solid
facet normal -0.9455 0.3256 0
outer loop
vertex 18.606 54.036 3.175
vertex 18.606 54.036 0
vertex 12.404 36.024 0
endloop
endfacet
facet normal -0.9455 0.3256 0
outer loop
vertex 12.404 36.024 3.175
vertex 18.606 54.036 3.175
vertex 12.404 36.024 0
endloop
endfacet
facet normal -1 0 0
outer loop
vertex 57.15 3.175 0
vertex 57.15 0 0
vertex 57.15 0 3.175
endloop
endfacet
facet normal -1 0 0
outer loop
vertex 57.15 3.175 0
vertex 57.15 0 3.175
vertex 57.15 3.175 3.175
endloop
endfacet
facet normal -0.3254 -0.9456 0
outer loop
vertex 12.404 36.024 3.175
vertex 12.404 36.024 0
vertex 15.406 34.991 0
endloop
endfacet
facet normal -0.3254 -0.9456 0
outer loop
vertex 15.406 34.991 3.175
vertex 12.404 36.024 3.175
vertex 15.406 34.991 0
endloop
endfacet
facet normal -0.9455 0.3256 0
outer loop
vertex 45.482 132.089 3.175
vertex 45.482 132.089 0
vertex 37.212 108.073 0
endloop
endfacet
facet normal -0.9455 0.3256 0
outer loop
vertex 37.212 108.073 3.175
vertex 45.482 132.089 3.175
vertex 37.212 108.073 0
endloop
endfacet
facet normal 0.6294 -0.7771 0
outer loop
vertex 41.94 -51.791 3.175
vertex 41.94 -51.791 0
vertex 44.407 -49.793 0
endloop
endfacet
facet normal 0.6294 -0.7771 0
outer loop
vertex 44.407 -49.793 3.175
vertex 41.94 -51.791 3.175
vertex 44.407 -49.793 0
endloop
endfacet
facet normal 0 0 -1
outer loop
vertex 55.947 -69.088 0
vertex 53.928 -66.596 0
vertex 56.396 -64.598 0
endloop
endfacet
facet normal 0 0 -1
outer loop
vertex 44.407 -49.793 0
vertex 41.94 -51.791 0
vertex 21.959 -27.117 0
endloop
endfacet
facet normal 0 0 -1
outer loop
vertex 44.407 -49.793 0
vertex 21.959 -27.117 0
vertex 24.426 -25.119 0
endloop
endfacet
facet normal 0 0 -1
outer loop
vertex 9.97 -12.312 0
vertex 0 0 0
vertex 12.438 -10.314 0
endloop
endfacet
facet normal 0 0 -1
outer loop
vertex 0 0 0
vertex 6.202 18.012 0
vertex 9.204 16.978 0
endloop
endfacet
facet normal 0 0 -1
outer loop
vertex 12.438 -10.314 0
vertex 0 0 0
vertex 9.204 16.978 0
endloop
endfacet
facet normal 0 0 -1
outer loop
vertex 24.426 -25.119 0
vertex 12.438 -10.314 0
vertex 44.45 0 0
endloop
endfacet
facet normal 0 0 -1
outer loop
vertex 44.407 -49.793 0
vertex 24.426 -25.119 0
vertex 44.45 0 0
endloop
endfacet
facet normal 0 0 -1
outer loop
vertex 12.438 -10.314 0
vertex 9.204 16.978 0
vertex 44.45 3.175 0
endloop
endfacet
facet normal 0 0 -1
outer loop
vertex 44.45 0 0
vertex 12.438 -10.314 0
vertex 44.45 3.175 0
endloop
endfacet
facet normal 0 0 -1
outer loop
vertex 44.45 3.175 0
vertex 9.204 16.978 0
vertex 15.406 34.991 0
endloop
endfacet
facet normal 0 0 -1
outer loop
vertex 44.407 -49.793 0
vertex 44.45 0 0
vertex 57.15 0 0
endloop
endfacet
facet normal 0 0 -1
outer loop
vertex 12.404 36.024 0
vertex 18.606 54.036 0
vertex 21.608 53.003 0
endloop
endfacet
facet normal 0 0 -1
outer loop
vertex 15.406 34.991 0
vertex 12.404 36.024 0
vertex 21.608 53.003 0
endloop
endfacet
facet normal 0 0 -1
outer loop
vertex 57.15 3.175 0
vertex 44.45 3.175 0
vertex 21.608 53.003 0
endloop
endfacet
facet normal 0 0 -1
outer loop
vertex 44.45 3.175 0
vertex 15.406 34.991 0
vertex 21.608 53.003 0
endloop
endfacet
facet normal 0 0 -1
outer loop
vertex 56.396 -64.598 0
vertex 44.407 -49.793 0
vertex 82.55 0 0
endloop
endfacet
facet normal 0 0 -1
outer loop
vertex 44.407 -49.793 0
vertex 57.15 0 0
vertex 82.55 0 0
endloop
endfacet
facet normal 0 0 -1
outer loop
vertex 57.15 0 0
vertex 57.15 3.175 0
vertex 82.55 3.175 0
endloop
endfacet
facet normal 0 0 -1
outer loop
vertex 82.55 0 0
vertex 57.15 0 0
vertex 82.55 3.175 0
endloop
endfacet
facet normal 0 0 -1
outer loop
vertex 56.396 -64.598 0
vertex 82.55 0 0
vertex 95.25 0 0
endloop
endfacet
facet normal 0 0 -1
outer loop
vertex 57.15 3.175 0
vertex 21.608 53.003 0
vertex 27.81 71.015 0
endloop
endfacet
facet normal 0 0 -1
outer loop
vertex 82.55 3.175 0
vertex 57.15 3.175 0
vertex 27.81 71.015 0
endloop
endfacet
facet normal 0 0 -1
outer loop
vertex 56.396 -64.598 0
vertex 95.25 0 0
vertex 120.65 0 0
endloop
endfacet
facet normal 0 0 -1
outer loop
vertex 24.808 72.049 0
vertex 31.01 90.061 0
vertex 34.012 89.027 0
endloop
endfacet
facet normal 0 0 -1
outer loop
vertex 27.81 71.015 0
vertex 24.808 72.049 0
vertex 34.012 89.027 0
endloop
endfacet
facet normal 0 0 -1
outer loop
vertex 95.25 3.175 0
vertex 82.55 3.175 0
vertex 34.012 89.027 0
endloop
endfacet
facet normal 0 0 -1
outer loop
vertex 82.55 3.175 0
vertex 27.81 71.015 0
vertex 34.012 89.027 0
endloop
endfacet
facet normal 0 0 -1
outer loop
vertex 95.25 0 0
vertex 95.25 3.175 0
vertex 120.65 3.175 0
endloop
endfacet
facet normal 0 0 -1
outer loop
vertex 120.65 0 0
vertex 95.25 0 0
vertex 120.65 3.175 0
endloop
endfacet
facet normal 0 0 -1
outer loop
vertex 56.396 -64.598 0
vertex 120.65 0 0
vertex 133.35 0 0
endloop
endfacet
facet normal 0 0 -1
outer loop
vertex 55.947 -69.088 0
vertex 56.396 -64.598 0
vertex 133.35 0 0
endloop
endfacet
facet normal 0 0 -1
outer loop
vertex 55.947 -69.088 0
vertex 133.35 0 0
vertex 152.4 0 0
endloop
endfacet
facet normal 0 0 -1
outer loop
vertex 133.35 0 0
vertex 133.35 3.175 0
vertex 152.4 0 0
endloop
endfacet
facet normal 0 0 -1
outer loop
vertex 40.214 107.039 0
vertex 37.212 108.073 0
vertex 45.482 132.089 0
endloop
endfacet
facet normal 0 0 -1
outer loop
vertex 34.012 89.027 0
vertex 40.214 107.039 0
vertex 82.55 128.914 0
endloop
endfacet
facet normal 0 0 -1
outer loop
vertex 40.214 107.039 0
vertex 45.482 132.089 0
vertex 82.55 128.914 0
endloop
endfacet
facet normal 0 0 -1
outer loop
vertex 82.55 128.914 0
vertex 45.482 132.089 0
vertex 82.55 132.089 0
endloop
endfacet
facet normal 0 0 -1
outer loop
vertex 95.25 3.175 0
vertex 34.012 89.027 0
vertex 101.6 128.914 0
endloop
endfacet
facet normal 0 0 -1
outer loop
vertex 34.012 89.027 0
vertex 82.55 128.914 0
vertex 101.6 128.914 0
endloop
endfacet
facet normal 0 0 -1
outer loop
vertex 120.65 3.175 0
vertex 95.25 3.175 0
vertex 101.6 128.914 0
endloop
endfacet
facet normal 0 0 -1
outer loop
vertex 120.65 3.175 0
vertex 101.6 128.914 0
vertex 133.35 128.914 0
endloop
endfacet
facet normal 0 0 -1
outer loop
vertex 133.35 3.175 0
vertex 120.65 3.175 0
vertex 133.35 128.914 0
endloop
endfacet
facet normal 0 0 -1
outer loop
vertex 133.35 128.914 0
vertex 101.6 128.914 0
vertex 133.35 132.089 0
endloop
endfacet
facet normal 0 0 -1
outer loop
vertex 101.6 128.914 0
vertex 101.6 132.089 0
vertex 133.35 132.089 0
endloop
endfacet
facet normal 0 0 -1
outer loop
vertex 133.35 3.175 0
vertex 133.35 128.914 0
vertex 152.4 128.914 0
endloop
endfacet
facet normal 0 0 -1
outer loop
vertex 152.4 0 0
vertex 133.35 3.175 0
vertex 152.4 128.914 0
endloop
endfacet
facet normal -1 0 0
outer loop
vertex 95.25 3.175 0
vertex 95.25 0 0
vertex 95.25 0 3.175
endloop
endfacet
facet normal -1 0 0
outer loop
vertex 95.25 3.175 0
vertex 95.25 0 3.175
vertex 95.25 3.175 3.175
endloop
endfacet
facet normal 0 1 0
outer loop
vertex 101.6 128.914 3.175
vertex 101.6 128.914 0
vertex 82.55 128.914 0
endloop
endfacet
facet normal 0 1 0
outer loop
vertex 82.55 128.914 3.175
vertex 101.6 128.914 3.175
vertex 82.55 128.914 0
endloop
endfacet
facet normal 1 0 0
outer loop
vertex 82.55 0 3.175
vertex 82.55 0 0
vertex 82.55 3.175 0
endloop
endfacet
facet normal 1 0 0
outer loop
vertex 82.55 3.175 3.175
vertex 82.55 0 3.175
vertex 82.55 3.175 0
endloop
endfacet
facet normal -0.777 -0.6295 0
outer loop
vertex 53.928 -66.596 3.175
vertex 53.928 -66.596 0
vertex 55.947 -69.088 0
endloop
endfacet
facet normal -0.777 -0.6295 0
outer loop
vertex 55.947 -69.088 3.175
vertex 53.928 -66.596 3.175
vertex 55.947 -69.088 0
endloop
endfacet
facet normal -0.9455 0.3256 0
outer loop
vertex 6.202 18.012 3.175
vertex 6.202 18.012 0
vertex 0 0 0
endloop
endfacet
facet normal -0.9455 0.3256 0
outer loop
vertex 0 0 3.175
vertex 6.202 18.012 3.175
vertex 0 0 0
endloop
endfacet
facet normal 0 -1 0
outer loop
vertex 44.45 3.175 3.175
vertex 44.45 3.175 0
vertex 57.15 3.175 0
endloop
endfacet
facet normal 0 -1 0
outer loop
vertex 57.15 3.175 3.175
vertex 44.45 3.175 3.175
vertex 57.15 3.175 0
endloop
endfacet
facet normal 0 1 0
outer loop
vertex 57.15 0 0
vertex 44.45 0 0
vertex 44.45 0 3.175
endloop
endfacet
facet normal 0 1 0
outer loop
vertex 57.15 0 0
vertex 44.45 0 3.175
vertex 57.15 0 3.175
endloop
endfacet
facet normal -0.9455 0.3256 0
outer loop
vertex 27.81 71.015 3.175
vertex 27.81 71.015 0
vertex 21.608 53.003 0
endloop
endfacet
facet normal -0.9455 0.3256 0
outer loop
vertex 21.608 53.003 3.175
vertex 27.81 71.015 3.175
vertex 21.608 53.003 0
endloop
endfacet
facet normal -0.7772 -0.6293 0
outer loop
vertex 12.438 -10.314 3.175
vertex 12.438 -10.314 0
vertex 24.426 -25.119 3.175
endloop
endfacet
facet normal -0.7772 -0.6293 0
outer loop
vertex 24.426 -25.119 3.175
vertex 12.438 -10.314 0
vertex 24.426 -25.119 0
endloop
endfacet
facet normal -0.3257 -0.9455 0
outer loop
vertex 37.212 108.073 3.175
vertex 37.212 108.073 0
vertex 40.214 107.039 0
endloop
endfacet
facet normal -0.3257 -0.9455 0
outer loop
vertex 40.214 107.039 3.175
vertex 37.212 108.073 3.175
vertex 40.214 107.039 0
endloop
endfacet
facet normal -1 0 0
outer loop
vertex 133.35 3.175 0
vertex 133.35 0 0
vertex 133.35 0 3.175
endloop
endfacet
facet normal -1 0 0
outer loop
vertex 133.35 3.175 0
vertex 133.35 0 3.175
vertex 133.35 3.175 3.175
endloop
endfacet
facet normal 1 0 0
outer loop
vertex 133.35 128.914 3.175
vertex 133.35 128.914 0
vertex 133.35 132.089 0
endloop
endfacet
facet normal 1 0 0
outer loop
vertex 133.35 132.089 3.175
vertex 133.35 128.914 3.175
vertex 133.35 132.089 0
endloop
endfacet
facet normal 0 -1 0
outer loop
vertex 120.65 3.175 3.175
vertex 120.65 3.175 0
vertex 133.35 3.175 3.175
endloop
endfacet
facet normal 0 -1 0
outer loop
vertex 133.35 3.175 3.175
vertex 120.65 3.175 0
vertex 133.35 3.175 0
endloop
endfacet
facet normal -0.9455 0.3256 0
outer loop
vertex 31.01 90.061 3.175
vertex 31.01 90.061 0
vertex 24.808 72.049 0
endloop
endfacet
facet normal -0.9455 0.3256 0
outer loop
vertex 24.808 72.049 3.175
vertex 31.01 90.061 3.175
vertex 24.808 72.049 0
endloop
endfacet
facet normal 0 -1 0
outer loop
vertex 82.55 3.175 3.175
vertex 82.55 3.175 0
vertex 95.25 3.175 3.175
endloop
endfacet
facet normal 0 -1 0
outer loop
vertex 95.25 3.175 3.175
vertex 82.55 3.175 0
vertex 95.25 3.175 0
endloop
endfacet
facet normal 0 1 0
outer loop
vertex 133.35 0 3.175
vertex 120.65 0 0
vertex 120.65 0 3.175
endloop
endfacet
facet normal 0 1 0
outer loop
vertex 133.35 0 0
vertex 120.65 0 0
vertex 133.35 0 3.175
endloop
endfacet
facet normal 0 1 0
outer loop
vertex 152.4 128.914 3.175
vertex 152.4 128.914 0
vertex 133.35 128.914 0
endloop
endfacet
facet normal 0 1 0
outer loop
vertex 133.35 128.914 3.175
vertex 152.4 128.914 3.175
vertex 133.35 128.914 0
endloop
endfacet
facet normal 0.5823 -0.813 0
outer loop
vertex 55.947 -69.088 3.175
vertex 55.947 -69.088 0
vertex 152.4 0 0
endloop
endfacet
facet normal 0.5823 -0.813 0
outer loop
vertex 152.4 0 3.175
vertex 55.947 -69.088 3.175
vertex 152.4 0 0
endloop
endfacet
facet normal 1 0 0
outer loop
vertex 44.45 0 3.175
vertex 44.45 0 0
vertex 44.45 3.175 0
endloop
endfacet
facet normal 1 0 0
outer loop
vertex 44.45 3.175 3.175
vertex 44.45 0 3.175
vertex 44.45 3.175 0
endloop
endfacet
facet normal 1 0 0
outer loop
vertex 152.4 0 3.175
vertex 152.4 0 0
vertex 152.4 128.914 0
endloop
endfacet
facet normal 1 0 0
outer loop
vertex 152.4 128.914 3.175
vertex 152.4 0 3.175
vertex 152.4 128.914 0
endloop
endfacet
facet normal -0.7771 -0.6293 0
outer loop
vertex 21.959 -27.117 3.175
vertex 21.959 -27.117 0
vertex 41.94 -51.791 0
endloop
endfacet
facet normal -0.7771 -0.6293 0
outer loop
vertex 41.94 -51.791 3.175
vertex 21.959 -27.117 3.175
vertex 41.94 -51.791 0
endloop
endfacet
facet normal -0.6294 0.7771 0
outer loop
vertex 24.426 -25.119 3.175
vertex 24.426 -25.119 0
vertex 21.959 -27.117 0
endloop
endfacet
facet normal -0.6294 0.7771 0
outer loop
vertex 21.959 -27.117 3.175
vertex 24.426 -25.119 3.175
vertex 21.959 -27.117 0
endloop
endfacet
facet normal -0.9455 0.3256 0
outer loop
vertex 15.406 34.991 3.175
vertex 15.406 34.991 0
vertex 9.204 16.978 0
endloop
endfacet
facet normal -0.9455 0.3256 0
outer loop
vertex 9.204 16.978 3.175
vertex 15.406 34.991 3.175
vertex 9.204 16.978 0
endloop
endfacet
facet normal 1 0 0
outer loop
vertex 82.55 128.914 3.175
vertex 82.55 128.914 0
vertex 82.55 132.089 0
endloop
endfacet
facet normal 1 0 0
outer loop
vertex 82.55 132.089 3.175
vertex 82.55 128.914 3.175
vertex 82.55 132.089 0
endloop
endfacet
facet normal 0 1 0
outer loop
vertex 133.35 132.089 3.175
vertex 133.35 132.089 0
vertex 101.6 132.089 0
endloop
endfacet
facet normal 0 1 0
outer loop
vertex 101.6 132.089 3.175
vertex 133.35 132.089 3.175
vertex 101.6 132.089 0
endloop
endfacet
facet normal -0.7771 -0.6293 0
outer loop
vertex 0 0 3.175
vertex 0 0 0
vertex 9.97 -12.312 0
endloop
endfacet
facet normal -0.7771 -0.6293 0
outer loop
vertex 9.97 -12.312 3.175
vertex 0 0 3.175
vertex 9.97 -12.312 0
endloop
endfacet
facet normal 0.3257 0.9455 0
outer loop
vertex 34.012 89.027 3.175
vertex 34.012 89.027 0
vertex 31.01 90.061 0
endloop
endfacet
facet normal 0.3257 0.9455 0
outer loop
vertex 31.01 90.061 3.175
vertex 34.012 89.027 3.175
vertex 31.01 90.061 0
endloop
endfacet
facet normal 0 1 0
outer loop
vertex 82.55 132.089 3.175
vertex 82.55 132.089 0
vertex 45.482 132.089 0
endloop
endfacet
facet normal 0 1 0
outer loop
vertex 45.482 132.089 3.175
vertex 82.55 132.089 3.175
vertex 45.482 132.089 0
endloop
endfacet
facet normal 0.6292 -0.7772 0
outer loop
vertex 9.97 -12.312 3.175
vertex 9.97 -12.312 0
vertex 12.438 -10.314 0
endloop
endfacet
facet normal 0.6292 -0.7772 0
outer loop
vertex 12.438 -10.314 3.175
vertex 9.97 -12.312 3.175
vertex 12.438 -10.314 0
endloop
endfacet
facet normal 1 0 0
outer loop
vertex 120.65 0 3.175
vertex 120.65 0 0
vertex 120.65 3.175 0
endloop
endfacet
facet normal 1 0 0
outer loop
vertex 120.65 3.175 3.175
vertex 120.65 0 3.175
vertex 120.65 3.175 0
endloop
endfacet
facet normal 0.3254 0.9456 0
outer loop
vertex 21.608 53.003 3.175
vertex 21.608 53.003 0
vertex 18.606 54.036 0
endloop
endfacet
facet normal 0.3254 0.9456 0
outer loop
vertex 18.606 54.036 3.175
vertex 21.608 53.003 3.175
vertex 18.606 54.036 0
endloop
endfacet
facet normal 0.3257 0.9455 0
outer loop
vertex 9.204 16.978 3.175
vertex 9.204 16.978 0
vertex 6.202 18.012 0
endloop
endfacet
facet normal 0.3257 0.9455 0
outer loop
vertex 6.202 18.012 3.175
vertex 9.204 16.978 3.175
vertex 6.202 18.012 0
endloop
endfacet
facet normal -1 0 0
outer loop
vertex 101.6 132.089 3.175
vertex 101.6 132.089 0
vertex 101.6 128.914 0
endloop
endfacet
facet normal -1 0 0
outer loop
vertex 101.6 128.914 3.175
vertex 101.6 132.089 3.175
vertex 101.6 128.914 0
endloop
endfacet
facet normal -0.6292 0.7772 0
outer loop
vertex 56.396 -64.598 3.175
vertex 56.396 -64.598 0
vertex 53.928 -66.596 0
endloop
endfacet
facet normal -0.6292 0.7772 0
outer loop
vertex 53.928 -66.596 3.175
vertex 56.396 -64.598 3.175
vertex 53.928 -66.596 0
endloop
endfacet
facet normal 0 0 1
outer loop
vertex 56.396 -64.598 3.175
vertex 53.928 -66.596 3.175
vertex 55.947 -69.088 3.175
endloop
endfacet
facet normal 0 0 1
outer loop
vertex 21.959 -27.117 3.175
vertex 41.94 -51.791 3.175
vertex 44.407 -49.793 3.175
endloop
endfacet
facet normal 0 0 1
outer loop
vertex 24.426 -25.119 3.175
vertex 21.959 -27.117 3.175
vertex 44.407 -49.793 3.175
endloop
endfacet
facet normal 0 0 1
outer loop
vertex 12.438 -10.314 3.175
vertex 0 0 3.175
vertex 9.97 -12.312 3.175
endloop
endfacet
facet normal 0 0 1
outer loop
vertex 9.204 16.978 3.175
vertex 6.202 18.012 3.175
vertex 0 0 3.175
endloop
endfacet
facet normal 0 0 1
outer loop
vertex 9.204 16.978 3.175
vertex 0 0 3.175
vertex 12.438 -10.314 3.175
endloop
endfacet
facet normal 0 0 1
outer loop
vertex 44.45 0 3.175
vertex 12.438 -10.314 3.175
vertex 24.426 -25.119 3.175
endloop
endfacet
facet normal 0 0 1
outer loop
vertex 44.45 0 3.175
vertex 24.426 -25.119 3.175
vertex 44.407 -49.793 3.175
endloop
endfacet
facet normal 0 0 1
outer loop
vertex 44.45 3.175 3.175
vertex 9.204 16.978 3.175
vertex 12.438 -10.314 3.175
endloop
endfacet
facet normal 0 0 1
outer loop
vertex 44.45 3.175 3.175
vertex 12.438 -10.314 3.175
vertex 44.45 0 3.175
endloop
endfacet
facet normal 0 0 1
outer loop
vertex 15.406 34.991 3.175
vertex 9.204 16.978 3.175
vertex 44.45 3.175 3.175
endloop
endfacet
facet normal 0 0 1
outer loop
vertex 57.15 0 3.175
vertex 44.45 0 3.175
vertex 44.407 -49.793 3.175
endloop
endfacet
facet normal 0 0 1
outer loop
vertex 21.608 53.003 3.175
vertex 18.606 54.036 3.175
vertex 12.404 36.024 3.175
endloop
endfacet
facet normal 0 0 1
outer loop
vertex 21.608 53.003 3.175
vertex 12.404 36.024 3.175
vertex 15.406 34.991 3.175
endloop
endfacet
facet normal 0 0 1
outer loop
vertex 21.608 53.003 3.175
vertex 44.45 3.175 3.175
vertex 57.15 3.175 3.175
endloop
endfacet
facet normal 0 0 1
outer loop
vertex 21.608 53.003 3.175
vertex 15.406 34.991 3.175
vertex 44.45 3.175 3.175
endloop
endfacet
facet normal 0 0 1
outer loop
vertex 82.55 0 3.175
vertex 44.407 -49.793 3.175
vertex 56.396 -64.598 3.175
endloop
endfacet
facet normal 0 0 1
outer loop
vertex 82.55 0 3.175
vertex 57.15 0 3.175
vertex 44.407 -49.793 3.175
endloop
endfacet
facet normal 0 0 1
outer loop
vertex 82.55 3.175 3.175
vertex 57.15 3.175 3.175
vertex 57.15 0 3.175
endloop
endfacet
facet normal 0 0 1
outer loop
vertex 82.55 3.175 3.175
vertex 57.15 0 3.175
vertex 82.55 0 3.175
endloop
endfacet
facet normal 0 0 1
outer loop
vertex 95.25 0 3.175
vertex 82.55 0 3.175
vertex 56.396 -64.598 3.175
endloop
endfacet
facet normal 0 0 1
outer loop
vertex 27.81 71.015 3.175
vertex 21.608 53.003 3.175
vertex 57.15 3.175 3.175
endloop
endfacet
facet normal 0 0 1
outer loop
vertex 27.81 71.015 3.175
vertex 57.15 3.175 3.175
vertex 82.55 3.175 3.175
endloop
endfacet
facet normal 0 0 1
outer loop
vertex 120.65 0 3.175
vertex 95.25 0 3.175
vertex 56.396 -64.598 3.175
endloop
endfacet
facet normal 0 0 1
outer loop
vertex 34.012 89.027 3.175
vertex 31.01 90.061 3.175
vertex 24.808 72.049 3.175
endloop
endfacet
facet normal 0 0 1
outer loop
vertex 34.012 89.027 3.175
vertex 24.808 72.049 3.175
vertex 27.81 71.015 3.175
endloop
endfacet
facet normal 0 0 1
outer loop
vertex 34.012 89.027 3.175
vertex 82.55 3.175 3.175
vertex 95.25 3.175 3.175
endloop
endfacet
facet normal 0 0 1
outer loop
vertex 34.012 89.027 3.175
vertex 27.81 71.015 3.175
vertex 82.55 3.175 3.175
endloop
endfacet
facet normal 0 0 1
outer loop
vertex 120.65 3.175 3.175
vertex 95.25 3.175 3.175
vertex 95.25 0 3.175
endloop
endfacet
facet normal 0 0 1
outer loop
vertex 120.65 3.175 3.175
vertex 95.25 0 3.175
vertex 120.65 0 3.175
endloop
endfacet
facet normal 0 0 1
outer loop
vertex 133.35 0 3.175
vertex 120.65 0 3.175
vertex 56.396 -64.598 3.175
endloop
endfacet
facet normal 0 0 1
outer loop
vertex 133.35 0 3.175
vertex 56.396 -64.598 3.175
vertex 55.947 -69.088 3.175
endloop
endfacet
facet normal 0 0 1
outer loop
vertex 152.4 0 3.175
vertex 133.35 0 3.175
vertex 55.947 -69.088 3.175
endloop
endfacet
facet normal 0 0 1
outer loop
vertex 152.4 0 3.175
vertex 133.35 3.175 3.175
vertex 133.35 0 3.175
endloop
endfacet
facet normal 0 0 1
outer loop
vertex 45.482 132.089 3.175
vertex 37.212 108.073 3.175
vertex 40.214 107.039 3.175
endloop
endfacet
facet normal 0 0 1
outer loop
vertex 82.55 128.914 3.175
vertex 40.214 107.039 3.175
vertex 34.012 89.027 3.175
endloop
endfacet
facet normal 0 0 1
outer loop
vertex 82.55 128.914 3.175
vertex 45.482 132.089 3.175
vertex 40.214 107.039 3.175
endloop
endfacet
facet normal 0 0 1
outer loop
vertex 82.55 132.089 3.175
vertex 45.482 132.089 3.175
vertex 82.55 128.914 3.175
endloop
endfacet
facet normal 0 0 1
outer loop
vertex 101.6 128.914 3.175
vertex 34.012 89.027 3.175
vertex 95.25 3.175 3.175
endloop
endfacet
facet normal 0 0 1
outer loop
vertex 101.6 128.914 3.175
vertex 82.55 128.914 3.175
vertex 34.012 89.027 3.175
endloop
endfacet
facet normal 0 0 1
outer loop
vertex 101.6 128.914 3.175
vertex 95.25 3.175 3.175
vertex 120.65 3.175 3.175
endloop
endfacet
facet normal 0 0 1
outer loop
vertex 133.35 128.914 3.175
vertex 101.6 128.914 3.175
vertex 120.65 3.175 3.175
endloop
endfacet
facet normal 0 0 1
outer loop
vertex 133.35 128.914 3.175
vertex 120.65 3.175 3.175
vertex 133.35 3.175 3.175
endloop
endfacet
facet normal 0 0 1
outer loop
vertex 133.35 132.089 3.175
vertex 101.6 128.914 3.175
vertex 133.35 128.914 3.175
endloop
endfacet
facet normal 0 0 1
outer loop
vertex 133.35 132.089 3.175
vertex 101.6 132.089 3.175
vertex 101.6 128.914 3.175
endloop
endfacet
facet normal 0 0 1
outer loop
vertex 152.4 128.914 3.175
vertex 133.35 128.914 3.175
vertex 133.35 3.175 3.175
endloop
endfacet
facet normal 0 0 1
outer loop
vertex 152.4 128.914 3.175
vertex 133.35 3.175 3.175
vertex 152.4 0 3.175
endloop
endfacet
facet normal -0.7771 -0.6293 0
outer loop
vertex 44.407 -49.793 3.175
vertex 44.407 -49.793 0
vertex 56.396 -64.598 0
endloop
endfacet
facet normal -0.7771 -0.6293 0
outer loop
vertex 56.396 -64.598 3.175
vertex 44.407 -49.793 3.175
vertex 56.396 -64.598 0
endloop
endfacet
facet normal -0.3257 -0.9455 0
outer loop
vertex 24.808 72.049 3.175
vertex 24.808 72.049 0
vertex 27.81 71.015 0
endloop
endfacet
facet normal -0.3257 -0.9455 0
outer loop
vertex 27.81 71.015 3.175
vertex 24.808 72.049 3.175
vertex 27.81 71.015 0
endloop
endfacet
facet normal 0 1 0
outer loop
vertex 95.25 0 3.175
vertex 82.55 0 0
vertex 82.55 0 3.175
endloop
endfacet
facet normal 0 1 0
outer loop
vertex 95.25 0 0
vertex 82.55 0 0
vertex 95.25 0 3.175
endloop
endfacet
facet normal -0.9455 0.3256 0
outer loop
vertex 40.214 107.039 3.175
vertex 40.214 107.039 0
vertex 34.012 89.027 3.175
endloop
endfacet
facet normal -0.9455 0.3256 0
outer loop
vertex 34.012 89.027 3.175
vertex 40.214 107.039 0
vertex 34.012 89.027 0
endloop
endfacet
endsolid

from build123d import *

# Parameters (mm, degrees)
SKETCH1_W           = 12.7
SKETCH1_H           = 3.175
BOSS_EXTRUDE1_DEPTH = 3.175


with BuildPart() as part:
    # Sketch1 → Boss-Extrude1 (new body)
    with BuildSketch(Plane.XY):
        Polygon((152.4, 0), (152.4, 128.913945011), (133.35, 128.913945011), (133.35, 132.088945011), (101.6, 132.088945011), (101.6, 128.913945011), (82.55, 128.913945011), (82.55, 132.088945011), (45.481871178, 132.088945011), (37.212440054, 108.072773191), (40.214461532, 107.039094301), (34.01238819, 89.026965435), (31.010366712, 90.060644326), (24.80829337, 72.048515461), (27.810314847, 71.01483657), (21.608241505, 53.002707705), (18.606220027, 54.036386596), (12.404146685, 36.02425773), (15.406168162, 34.99057884), (9.20409482, 16.978449975), (6.202073342, 18.012128865), (0, 0), (9.97035014, -12.312357038), (12.437788568, -10.314264796), (24.426342017, -25.118895362), (21.95890359, -27.116987604), (41.939826006, -51.79137188), (44.407264433, -49.793279638), (56.395817883, -64.597910204), (53.928379455, -66.596002446), (55.946582764, -69.088275974), align=None)
        with Locations((88.9, 1.5875)):
            Rectangle(SKETCH1_W, SKETCH1_H, mode=Mode.SUBTRACT)
        with Locations((127, 1.5875)):
            Rectangle(SKETCH1_W, SKETCH1_H, mode=Mode.SUBTRACT)
        with Locations((50.8, 1.5875)):
            Rectangle(SKETCH1_W, SKETCH1_H, mode=Mode.SUBTRACT)
    extrude(amount=BOSS_EXTRUDE1_DEPTH)


solid = part.part
